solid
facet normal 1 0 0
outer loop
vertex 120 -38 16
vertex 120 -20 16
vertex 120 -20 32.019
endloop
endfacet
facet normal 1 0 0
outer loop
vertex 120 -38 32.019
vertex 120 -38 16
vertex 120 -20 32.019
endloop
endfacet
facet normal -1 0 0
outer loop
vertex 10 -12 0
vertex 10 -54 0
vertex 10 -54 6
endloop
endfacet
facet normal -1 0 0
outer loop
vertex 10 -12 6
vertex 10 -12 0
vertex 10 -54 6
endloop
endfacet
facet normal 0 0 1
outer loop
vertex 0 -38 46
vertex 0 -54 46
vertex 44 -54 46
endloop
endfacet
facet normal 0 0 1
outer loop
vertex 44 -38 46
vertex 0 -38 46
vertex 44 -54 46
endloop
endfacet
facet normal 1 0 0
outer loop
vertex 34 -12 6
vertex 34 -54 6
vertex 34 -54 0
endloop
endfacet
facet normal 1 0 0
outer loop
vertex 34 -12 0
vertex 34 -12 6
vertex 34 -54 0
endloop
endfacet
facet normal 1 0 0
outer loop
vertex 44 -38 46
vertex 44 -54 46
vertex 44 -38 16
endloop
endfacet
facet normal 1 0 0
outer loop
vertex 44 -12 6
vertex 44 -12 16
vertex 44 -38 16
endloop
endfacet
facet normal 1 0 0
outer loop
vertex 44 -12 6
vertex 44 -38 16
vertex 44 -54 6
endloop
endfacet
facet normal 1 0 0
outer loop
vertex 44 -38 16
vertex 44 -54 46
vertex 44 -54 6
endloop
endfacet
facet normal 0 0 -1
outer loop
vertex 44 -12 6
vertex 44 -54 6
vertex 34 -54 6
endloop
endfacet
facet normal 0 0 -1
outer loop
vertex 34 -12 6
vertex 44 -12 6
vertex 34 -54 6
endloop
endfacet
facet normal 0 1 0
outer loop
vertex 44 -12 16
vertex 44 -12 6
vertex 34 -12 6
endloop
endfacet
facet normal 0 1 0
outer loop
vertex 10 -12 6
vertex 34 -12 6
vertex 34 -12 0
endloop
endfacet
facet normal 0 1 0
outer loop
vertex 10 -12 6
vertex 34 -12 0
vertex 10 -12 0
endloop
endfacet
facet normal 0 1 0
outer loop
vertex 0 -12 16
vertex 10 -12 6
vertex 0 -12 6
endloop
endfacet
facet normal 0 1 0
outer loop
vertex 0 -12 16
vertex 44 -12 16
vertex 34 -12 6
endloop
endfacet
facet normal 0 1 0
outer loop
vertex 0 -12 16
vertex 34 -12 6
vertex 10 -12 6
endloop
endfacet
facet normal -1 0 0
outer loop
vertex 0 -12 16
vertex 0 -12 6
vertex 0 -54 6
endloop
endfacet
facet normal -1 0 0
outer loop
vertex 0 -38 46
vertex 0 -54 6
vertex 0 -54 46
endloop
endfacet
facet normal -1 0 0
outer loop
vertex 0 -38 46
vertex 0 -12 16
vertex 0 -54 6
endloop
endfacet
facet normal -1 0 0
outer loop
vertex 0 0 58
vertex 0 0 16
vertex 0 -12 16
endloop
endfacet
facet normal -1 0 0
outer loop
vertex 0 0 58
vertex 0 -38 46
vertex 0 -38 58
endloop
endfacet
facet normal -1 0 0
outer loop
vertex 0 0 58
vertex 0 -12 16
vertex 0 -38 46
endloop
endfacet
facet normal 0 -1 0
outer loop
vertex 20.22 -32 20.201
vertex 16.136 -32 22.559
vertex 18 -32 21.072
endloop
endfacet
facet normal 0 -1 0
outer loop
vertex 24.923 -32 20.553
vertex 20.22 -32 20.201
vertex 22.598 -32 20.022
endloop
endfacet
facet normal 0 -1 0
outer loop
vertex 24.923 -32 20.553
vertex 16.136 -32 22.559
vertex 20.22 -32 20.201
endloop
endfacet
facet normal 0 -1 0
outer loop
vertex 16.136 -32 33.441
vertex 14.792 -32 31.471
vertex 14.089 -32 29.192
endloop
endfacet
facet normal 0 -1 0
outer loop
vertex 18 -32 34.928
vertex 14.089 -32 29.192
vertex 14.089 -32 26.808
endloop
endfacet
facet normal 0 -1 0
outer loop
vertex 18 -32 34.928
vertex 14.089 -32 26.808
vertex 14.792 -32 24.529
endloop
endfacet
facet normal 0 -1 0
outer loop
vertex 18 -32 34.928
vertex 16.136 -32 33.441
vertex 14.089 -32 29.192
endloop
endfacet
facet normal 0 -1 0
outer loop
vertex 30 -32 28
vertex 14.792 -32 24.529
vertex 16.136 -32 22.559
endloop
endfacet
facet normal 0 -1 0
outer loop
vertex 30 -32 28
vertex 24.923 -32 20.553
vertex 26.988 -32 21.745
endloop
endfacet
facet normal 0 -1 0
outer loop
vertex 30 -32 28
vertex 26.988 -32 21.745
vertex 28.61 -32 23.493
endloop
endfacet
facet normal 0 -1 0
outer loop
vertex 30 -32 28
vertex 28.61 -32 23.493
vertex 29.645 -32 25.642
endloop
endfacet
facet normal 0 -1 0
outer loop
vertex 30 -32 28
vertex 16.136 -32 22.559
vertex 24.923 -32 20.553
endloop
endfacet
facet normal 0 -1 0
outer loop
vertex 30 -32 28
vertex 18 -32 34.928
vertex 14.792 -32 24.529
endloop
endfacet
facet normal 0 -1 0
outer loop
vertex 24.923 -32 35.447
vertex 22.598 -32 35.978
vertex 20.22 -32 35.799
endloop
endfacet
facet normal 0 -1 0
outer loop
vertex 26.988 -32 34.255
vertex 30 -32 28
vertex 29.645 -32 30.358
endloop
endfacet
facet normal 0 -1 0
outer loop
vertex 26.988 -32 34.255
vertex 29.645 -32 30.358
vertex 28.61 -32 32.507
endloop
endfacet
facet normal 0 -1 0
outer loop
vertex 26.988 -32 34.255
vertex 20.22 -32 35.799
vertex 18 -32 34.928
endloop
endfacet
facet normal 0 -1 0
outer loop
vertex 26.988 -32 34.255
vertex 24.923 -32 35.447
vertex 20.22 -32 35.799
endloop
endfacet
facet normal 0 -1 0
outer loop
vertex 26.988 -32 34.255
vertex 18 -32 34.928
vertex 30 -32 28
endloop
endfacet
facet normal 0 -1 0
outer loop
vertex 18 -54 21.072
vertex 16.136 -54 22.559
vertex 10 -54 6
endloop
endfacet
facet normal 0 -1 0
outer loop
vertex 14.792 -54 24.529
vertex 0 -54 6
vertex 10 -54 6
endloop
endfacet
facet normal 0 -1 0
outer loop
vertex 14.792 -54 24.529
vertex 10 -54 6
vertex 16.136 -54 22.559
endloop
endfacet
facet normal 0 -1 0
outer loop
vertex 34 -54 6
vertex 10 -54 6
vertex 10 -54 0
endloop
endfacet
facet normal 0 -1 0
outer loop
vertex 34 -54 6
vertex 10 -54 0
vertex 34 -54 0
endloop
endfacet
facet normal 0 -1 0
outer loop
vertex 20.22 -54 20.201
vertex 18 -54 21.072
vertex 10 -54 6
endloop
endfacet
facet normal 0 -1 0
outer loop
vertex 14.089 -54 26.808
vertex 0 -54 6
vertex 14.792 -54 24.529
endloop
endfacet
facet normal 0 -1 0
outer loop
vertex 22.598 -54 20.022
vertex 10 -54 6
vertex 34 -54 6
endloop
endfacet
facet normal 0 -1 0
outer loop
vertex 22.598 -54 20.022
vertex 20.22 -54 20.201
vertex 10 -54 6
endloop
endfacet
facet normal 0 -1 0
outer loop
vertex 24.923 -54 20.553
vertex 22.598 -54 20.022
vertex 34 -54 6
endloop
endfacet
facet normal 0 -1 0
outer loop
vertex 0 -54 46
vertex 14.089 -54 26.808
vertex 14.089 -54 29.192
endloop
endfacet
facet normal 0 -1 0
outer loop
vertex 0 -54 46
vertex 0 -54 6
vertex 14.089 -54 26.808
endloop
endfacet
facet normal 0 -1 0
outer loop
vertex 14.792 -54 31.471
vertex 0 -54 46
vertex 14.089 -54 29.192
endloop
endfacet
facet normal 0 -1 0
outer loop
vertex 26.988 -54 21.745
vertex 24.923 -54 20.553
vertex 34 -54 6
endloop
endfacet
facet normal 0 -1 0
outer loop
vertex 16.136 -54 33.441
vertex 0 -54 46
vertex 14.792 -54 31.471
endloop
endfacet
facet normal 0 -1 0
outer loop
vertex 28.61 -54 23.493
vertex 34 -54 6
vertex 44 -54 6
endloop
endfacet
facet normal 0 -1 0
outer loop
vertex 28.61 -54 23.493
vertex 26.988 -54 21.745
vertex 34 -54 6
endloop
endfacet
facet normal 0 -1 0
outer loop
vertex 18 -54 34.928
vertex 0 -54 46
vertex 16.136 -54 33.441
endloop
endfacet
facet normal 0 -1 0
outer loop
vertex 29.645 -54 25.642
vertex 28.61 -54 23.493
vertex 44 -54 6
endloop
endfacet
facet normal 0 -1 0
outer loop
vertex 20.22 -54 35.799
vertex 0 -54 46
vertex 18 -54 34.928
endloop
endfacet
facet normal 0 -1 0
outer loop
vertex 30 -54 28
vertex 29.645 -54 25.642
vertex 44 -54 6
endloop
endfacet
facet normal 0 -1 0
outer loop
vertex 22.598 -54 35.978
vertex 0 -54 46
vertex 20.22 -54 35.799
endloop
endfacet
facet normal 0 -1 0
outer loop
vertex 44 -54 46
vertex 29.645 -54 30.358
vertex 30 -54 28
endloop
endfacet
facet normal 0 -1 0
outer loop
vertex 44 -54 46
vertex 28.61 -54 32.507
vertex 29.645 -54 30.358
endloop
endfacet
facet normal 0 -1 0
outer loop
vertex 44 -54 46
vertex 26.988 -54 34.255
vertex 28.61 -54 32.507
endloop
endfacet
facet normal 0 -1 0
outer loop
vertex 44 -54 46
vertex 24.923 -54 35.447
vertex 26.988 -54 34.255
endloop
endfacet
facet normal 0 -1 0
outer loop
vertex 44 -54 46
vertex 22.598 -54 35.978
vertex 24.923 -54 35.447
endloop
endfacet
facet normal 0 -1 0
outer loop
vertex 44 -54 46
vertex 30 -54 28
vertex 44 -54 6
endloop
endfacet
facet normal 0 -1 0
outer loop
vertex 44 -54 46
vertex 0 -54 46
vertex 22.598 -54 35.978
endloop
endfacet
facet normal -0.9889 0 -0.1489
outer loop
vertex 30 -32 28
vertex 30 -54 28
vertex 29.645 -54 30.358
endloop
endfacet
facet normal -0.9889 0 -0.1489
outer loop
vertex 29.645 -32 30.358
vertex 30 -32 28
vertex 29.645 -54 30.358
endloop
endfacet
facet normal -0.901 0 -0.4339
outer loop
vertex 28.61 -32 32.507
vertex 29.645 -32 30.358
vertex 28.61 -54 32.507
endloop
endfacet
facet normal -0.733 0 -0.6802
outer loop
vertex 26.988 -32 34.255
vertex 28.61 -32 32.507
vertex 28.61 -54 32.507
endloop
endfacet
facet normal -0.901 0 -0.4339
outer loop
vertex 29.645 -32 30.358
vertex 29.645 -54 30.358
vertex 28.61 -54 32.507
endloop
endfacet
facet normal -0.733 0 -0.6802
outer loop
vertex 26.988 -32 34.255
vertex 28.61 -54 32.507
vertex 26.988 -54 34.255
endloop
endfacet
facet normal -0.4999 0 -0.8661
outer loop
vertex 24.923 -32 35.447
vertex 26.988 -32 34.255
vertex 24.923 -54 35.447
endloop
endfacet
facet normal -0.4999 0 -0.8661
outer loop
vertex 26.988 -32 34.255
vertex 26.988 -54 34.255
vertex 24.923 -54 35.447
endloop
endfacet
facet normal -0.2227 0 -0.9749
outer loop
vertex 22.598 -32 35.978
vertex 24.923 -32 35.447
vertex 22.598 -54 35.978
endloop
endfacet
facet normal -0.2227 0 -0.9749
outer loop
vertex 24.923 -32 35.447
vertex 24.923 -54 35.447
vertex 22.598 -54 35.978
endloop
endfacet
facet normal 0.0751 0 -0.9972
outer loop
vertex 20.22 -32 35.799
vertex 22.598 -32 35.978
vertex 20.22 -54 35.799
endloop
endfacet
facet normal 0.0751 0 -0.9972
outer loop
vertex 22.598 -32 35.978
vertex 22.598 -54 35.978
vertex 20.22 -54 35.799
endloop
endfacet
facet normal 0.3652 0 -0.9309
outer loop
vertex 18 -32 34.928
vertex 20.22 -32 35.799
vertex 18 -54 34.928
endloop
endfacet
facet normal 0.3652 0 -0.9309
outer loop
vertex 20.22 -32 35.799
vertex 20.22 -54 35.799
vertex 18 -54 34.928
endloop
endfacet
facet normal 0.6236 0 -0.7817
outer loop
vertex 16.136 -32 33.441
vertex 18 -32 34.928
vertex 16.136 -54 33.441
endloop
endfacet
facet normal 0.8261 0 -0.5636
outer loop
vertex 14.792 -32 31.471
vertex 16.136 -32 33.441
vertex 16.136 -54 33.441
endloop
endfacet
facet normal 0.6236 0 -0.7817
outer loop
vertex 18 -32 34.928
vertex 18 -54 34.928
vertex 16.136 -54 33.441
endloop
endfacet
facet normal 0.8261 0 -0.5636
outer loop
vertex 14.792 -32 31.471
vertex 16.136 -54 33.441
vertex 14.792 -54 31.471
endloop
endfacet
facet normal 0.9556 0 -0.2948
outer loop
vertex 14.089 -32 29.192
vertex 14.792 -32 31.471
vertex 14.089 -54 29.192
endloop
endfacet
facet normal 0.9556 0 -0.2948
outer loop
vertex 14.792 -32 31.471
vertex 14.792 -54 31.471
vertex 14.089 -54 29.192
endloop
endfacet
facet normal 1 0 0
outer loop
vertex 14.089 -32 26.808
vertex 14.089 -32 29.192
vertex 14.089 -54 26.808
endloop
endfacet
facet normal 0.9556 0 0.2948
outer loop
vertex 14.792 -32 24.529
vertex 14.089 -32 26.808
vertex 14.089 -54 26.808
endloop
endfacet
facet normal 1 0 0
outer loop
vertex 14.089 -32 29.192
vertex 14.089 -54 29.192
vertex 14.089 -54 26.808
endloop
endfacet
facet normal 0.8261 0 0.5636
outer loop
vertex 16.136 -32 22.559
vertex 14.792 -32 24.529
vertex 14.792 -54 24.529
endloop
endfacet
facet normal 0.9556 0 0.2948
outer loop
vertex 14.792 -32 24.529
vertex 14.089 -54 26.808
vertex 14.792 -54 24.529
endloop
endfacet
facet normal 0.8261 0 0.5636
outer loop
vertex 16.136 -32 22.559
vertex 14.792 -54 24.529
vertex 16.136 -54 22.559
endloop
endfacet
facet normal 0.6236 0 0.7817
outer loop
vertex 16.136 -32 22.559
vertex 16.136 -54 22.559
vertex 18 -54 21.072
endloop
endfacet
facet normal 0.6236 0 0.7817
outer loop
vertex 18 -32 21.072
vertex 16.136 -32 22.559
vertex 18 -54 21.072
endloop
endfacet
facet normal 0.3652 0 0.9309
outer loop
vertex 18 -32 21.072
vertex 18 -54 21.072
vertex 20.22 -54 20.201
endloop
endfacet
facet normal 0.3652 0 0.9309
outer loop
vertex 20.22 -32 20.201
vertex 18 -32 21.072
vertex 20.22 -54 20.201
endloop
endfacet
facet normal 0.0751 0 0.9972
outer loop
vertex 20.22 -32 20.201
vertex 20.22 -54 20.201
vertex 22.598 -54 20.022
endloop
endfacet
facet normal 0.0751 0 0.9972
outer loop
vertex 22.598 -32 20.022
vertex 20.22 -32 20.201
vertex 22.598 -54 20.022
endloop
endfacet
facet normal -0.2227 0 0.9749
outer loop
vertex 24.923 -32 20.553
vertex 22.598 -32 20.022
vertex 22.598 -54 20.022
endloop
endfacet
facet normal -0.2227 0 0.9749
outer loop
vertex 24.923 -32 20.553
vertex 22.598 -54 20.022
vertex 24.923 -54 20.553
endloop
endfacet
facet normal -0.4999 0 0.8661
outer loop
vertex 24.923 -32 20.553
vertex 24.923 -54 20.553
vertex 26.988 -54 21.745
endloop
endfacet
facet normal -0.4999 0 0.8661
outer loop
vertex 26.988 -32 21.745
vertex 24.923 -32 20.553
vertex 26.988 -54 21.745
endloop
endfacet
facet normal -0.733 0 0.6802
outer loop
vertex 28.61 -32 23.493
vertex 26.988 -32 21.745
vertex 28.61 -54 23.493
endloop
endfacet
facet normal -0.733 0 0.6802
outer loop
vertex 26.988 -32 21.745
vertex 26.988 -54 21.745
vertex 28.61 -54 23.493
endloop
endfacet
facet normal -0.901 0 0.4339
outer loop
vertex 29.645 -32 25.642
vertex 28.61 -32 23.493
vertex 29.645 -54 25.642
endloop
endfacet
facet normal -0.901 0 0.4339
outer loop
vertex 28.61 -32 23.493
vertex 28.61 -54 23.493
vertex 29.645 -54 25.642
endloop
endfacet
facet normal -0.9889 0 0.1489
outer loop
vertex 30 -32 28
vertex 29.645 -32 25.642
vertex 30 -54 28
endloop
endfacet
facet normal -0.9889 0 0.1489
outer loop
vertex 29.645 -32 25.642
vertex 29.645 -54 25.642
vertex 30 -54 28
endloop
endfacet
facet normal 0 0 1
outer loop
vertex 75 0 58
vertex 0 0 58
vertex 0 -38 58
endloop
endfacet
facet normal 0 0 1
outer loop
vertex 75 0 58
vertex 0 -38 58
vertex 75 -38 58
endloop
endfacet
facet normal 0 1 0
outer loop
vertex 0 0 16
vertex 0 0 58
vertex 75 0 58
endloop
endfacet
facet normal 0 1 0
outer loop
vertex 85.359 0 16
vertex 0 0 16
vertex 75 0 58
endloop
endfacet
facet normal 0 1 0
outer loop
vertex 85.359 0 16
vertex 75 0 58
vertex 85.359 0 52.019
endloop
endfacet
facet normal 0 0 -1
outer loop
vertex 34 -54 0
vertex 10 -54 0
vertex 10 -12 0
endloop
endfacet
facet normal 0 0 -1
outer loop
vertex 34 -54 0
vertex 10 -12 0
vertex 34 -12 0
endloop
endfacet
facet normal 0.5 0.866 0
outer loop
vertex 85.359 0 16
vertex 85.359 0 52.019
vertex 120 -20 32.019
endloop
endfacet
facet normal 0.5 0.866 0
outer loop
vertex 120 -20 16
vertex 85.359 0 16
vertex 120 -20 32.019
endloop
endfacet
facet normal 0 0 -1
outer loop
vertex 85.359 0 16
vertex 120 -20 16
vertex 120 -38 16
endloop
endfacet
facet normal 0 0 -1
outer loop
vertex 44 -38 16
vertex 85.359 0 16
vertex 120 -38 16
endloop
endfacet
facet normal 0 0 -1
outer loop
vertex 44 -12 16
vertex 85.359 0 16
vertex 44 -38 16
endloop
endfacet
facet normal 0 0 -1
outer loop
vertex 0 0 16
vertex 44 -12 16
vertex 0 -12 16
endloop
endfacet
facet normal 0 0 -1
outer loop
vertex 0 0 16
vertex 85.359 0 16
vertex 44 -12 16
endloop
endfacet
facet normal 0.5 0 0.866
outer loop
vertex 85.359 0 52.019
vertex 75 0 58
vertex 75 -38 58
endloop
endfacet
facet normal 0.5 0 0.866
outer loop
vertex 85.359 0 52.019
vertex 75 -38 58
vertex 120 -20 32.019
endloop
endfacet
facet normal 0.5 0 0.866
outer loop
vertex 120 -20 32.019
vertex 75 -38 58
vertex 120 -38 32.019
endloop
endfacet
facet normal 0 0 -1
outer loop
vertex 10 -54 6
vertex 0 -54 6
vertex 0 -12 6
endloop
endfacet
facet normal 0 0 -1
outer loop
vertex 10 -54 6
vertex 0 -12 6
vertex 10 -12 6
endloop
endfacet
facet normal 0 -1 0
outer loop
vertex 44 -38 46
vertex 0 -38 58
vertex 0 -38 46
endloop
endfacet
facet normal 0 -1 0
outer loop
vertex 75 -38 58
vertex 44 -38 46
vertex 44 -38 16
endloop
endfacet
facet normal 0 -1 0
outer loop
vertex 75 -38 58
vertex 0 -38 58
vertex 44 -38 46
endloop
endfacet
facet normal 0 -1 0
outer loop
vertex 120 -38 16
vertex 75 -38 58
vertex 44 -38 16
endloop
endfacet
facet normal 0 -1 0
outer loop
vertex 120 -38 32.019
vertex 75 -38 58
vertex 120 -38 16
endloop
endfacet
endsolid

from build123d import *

# Parameters (mm, degrees)
F0_W      = 120
F0_H      = 58
F1_DEPTH  = 54
F2_W      = 10
F2_H      = 6
F3_DEPTH  = 54.001
F5_DEPTH  = 16
F6_R      = 8
F7_DEPTH  = 22
F8_W      = 44
F8_H      = 16
F9_DEPTH  = 12
F11_DEPTH = 58.001


with BuildPart() as f1:
    # F0 (on Front) → F1 (new body)
    with BuildSketch(Plane.XZ):
        with Locations((60, 29)):
            Rectangle(F0_W, F0_H)
    extrude(amount=F1_DEPTH)

    # F2 (on face) → F3 (cut, through all)
    with BuildSketch(Plane.XZ.offset(54)):
        Polygon((34, 6), (34, 0), (120, 0), (120, 16), (44, 16), (44, 6), align=None)
        Polygon((120, 58), (75, 58), (120, 32.019238), align=None)
        with Locations((5, 3)):
            Rectangle(F2_W, F2_H)
    extrude(amount=-F3_DEPTH, mode=Mode.SUBTRACT)

    # F4 (on face) → F5 (cut)
    with BuildSketch(Plane.XZ.offset(54)):
        Polygon((75, 58), (0, 58), (0, 46), (44, 46), (44, 16), (120, 16), (120, 32.019238), align=None)
    extrude(amount=-F5_DEPTH, mode=Mode.SUBTRACT)

    # F6 (on face) → F7 (cut)
    with BuildSketch(Plane.XZ.offset(54)):
        with Locations((22, 28)):
            Circle(F6_R)
    extrude(amount=-F7_DEPTH, mode=Mode.SUBTRACT)

    # F8 (on face) → F9 (cut)
    with BuildSketch(Plane(origin=(0, 0, 0), x_dir=(-1, 0, 0), z_dir=(0, 1, 0))):
        with Locations((-22, 8)):
            Rectangle(F8_W, F8_H)
    extrude(amount=-F9_DEPTH, mode=Mode.SUBTRACT)

    # F10 (on face) → F11 (cut, through all)
    with BuildSketch(Plane.XY.offset(58)):
        Polygon((85.358984, 0), (120, -20), (120, 0), align=None)
    extrude(amount=-F11_DEPTH, mode=Mode.SUBTRACT)


solid = f1.part
